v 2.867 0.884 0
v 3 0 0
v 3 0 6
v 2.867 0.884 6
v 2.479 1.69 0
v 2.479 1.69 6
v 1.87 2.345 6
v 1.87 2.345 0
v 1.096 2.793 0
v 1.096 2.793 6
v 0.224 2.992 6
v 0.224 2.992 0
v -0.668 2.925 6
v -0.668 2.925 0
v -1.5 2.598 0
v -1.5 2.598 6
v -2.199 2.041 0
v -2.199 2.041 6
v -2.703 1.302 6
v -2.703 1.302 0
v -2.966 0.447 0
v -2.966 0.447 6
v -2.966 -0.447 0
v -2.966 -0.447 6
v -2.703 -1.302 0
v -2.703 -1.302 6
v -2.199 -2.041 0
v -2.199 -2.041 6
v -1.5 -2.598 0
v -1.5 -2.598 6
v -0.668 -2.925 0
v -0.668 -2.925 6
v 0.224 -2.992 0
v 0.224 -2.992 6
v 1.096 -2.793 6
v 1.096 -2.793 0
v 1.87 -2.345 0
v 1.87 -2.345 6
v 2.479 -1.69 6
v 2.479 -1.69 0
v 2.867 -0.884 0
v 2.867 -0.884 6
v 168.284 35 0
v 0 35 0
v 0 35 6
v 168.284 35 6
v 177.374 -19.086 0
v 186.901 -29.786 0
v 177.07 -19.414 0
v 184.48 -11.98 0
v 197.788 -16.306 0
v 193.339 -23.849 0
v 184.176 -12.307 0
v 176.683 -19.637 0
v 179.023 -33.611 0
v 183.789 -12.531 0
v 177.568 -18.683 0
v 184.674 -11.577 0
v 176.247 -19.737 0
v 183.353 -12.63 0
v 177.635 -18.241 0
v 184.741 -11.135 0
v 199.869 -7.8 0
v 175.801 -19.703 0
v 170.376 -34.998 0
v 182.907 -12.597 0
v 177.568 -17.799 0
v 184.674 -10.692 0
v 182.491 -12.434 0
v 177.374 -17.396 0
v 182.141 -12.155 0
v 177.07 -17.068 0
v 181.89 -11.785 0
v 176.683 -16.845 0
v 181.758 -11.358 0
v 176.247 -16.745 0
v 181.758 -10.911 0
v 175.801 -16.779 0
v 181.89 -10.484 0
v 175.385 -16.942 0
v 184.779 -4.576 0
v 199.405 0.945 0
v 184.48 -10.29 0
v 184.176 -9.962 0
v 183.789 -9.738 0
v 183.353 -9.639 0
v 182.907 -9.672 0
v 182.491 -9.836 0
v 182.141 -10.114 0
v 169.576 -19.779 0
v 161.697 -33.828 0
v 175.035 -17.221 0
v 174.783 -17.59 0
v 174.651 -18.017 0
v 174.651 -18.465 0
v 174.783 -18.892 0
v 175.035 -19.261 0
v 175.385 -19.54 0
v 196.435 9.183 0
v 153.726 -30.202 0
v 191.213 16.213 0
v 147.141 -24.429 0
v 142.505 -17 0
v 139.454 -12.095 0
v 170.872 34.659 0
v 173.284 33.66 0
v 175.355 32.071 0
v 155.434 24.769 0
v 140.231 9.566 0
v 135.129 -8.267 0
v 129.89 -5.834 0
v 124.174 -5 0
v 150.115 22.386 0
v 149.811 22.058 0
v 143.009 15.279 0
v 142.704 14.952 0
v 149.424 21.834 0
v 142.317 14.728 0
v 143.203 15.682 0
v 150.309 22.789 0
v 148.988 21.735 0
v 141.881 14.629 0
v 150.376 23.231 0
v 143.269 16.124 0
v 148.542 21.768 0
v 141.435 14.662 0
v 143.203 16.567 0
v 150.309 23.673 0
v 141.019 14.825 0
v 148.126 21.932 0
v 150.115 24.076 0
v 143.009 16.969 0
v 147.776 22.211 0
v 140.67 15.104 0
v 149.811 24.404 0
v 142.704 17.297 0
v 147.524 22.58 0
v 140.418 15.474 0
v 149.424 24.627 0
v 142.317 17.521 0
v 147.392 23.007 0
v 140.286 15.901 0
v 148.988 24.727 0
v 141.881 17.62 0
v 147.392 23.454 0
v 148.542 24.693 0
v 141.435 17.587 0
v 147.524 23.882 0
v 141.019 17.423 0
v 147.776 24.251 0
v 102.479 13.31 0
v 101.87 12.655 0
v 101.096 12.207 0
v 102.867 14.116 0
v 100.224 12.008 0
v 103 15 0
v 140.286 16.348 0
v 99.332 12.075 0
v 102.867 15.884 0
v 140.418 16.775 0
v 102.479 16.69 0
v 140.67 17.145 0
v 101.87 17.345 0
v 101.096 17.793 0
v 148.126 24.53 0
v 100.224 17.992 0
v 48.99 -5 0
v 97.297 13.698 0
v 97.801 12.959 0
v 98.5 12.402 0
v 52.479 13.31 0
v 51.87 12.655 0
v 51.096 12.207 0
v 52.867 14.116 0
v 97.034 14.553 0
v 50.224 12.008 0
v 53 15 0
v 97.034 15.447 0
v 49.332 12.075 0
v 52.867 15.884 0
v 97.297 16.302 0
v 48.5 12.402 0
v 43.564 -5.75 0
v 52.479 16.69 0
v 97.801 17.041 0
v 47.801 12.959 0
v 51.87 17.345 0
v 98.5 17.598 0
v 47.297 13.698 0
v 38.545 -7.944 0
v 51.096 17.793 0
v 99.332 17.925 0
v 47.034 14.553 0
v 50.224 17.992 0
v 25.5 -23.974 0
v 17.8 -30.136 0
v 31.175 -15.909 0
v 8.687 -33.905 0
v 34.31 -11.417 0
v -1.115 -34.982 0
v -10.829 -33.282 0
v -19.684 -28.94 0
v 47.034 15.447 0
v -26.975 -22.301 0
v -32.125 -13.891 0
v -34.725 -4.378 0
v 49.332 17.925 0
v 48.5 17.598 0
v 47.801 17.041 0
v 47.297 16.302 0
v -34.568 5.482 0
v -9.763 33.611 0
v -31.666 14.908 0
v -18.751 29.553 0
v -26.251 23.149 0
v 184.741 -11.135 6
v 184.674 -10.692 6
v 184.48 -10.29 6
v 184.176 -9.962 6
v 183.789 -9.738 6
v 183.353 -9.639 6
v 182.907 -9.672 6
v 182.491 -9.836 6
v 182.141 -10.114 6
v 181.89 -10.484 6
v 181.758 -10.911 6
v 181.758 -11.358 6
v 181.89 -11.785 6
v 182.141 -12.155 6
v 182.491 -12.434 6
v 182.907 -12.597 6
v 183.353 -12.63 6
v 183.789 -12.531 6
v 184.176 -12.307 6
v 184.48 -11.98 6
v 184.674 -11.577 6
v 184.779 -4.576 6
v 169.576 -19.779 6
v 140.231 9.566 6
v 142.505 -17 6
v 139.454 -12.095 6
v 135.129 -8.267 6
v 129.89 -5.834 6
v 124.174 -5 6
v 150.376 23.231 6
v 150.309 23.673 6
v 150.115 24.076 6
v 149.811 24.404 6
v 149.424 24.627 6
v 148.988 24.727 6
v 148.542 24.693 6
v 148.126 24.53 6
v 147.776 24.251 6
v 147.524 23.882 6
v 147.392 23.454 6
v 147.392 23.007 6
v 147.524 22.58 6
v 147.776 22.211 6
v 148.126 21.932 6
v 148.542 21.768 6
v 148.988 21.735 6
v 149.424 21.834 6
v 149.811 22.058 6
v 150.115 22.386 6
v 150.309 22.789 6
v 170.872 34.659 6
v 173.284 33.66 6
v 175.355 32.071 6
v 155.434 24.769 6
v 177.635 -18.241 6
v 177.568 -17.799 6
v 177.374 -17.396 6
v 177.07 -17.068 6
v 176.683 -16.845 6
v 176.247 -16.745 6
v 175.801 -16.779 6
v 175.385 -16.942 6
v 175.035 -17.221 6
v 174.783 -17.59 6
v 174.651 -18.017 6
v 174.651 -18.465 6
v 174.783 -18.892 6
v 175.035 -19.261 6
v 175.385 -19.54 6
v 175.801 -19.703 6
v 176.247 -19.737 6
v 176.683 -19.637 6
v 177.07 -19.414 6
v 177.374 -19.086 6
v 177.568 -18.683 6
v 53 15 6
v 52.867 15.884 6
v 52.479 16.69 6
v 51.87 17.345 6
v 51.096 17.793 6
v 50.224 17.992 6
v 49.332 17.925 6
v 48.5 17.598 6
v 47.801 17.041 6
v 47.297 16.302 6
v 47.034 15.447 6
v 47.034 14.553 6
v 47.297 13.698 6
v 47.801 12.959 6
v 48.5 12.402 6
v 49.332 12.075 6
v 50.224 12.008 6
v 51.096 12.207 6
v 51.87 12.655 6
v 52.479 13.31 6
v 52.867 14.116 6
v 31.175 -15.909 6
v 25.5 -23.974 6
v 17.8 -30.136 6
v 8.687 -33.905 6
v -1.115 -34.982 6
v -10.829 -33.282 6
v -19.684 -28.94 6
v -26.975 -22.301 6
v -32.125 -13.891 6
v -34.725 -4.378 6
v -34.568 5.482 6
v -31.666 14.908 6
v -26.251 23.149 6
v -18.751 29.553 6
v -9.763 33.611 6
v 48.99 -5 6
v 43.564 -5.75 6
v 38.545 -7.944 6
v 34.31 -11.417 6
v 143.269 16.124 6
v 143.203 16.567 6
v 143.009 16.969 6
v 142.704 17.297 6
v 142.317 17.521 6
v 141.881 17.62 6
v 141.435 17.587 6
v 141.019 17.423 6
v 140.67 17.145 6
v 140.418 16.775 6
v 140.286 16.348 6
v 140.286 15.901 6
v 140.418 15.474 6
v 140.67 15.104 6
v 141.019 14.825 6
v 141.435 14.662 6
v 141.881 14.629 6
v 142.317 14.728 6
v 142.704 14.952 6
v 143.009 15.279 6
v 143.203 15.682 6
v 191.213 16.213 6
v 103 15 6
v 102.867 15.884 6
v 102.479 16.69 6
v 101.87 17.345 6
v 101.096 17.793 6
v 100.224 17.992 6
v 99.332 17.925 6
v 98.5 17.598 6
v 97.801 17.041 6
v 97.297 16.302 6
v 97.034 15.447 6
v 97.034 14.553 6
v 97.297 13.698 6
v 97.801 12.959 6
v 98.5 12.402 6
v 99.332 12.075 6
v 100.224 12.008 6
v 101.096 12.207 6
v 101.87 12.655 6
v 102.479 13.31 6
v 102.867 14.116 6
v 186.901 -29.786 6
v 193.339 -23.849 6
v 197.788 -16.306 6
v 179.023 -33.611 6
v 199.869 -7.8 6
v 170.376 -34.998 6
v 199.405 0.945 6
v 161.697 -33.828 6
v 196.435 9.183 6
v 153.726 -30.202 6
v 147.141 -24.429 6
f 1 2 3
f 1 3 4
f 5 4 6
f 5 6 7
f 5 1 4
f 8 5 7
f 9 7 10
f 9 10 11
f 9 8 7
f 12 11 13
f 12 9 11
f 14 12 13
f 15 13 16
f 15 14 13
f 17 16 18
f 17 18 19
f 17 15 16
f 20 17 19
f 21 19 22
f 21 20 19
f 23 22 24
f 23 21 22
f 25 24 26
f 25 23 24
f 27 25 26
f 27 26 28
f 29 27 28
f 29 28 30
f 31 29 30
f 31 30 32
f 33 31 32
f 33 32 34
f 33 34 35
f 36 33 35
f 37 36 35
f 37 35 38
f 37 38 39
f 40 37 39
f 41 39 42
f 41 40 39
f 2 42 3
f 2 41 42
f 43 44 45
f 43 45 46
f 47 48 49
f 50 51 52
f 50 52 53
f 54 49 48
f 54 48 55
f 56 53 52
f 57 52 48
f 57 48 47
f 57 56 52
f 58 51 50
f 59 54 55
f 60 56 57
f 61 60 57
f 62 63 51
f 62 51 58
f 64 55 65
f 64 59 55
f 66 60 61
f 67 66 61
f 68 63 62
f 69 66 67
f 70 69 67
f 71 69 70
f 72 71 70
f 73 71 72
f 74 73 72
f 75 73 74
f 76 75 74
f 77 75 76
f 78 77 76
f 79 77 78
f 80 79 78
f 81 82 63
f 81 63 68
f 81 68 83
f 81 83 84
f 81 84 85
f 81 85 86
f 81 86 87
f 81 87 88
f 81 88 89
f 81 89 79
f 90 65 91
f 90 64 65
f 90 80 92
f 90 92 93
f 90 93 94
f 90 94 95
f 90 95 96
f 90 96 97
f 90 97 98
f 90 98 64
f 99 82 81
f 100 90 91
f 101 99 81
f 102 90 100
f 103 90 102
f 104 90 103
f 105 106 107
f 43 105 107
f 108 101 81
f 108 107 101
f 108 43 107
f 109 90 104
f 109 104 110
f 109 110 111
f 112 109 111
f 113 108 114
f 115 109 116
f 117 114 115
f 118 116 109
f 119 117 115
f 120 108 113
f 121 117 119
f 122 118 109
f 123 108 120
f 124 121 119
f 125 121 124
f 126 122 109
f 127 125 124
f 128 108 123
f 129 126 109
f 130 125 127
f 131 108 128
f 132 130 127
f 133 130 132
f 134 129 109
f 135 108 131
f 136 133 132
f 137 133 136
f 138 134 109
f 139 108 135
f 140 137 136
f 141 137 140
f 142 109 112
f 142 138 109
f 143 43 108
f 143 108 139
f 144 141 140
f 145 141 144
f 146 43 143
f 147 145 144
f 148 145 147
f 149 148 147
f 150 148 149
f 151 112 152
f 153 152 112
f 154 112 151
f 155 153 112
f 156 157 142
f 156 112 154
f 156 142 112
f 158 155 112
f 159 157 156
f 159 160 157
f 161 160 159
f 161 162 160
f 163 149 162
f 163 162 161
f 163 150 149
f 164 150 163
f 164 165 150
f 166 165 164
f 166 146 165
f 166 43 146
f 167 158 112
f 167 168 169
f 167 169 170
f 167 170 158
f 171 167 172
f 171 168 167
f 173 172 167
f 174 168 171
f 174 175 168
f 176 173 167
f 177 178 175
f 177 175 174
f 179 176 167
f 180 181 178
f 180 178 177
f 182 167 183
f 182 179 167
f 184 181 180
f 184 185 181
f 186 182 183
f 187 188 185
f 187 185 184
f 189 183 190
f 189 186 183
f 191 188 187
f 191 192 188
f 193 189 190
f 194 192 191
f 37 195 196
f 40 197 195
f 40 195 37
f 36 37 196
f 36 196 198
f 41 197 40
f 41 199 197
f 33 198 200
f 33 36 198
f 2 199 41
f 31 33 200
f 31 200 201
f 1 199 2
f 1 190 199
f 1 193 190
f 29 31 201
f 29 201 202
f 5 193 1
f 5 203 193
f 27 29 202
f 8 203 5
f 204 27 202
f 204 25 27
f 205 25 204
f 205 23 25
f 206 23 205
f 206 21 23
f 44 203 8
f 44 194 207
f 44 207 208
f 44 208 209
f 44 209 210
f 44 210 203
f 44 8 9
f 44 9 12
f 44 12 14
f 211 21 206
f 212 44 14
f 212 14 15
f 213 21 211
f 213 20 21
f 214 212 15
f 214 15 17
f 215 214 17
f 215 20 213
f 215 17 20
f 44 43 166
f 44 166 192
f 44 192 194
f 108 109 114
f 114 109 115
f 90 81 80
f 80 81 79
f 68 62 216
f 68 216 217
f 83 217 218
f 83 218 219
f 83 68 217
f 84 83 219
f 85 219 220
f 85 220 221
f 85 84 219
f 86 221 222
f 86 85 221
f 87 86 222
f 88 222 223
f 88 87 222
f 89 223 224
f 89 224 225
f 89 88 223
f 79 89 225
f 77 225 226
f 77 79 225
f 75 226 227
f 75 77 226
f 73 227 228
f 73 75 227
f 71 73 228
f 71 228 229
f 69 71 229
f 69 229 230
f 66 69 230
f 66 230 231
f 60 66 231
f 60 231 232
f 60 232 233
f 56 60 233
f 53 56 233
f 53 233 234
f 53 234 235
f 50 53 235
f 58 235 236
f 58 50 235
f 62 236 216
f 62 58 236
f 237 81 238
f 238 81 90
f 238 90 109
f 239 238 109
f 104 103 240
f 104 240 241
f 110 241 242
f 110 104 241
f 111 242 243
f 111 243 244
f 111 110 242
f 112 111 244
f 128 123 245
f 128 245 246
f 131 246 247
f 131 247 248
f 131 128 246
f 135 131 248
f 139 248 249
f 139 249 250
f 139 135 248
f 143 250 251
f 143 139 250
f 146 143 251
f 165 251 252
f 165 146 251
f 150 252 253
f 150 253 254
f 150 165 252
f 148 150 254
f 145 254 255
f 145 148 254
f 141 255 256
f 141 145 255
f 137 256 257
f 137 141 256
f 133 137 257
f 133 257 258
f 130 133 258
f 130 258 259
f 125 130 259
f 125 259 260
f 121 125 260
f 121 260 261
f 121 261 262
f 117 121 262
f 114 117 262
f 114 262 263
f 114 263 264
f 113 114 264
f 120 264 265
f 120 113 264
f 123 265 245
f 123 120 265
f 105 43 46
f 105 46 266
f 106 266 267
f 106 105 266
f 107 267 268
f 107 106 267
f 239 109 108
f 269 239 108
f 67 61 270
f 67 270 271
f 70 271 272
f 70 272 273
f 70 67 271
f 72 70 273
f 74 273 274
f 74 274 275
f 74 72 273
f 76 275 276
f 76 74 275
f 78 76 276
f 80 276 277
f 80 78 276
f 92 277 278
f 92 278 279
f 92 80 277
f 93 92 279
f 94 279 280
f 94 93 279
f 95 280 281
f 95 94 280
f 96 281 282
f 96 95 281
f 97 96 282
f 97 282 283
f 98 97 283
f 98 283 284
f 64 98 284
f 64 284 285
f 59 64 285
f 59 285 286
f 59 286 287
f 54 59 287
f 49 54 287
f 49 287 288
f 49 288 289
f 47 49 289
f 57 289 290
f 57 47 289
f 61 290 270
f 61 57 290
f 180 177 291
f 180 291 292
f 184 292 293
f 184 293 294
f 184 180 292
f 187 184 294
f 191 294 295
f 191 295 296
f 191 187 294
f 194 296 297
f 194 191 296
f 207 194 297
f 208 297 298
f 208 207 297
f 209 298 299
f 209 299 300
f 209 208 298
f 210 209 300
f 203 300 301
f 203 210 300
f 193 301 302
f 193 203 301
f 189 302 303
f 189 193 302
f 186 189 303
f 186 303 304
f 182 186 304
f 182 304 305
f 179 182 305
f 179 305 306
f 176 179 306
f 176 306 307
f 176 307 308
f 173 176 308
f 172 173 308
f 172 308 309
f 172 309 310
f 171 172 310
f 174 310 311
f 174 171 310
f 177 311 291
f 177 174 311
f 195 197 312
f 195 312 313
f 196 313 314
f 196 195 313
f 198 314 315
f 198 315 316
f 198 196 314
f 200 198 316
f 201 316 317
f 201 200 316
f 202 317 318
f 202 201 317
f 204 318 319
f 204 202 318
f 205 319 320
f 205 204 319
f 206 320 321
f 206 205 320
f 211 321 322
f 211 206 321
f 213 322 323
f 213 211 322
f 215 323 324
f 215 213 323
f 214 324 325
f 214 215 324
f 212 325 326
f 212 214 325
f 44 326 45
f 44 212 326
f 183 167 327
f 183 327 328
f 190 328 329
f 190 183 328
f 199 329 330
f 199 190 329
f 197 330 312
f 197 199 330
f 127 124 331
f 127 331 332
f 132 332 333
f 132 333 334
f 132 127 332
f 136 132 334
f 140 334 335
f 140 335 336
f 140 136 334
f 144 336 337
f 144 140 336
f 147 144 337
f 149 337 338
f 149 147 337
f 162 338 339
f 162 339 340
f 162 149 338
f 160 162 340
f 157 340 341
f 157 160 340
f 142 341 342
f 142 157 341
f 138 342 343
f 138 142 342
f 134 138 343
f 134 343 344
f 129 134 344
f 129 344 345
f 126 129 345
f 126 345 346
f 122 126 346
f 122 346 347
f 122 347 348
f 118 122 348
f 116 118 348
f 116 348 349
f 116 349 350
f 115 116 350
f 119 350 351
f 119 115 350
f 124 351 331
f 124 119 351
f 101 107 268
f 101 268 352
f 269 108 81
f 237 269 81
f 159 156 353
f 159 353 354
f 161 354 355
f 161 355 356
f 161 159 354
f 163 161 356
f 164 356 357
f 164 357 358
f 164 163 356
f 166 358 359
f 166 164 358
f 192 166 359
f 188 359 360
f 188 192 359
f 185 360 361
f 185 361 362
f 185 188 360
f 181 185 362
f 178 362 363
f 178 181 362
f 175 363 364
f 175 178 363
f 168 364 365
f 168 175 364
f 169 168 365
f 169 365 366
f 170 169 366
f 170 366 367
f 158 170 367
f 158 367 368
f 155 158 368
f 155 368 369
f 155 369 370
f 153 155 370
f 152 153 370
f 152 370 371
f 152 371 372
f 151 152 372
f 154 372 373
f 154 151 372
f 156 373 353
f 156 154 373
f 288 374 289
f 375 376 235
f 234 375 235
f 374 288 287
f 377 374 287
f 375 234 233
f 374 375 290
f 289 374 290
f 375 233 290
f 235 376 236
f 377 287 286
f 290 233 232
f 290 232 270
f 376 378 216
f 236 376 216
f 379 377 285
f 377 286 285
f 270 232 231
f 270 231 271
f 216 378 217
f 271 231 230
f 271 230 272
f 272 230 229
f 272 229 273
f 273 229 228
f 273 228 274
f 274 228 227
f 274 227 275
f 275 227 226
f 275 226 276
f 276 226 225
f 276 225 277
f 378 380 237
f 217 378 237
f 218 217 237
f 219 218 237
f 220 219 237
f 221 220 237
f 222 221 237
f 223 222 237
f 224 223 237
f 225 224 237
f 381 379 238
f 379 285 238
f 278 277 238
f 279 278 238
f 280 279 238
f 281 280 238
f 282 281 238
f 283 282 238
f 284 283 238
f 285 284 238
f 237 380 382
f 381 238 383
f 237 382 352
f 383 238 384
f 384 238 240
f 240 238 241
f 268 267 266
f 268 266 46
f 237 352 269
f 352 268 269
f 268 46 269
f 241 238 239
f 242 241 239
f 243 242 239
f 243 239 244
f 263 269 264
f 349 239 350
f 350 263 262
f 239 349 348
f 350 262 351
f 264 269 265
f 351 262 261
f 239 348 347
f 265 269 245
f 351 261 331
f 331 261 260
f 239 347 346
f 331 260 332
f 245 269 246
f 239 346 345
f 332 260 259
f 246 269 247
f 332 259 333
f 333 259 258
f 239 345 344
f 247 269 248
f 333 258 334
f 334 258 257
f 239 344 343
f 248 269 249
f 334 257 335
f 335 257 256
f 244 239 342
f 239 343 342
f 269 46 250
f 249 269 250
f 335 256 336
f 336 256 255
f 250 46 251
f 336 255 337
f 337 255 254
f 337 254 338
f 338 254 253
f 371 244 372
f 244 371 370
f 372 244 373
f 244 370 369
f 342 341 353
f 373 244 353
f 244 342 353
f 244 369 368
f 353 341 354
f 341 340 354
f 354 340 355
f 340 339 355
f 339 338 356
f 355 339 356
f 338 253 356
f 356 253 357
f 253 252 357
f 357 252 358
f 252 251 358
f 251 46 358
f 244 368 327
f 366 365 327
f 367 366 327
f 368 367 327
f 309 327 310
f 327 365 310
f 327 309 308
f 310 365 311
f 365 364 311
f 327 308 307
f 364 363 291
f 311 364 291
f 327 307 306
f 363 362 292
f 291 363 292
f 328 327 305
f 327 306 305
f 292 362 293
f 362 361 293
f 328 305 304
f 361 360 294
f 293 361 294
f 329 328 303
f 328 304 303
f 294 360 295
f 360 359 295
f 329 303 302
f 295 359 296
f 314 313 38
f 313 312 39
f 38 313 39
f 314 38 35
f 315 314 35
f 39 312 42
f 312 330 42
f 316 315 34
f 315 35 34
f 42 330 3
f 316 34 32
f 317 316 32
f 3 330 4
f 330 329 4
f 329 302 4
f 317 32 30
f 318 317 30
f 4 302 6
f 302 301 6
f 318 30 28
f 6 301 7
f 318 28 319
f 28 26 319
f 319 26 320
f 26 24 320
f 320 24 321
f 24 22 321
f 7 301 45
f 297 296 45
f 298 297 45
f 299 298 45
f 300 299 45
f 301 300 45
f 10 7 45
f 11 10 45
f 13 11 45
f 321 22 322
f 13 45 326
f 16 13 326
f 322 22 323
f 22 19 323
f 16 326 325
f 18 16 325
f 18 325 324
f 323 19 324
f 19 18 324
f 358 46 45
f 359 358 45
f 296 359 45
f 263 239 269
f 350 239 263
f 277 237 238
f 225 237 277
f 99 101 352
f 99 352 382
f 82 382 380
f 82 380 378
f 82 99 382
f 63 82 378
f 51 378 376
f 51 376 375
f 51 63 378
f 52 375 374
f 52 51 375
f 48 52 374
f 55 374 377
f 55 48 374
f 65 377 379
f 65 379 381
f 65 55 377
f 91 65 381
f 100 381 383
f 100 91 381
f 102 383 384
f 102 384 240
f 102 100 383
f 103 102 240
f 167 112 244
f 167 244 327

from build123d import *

# Parameters (mm, degrees)
SKETCH1_R           = 3
SKETCH1_R_2         = 1.5
BOSS_EXTRUDE1_DEPTH = 6


with BuildPart() as part:
    # Sketch1 → Boss-Extrude1 (new body)
    with BuildSketch(Plane.XY):
        with BuildLine():
            Line((0, 35), (168.284271247, 35))
            ThreePointArc((168.284271247, 35), (172.111105571, 34.238795325), (175.355339059, 32.071067812))
            Line((175.355339059, 32.071067812), (191.213203436, 16.213203436))
            ThreePointArc((191.213203436, 16.213203436), (186.901061777, -29.786167732), (142.50454583, -17))
            ThreePointArc((142.50454583, -17), (135.128694201, -8.266799469), (124.17424305, -5))
            Line((124.17424305, -5), (48.989794856, -5))
            ThreePointArc((48.989794856, -5), (38.545135498, -7.943942692), (31.175323999, -15.909090909))
            ThreePointArc((31.175323999, -15.909090909), (-29.84810029, -18.278153875), (0, 35))
        make_face()
        Circle(SKETCH1_R, mode=Mode.SUBTRACT)
        with Locations((50, 15)):
            Circle(SKETCH1_R, mode=Mode.SUBTRACT)
        with Locations((100, 15)):
            Circle(SKETCH1_R, mode=Mode.SUBTRACT)
        with Locations((183.241017493, -11.134594342)):
            Circle(SKETCH1_R_2, mode=Mode.SUBTRACT)
        with Locations((176.134594342, -18.241017493)):
            Circle(SKETCH1_R_2, mode=Mode.SUBTRACT)
        with Locations((141.769204776, 16.124372073)):
            Circle(SKETCH1_R_2, mode=Mode.SUBTRACT)
        with Locations((148.875627927, 23.230795224)):
            Circle(SKETCH1_R_2, mode=Mode.SUBTRACT)
        Polygon((155.434043323, 24.768752473), (184.778974742, -4.576178946), (169.576178946, -19.778974742), (140.231247527, 9.565956677), align=None, mode=Mode.SUBTRACT)
    extrude(amount=BOSS_EXTRUDE1_DEPTH)


solid = part.part
